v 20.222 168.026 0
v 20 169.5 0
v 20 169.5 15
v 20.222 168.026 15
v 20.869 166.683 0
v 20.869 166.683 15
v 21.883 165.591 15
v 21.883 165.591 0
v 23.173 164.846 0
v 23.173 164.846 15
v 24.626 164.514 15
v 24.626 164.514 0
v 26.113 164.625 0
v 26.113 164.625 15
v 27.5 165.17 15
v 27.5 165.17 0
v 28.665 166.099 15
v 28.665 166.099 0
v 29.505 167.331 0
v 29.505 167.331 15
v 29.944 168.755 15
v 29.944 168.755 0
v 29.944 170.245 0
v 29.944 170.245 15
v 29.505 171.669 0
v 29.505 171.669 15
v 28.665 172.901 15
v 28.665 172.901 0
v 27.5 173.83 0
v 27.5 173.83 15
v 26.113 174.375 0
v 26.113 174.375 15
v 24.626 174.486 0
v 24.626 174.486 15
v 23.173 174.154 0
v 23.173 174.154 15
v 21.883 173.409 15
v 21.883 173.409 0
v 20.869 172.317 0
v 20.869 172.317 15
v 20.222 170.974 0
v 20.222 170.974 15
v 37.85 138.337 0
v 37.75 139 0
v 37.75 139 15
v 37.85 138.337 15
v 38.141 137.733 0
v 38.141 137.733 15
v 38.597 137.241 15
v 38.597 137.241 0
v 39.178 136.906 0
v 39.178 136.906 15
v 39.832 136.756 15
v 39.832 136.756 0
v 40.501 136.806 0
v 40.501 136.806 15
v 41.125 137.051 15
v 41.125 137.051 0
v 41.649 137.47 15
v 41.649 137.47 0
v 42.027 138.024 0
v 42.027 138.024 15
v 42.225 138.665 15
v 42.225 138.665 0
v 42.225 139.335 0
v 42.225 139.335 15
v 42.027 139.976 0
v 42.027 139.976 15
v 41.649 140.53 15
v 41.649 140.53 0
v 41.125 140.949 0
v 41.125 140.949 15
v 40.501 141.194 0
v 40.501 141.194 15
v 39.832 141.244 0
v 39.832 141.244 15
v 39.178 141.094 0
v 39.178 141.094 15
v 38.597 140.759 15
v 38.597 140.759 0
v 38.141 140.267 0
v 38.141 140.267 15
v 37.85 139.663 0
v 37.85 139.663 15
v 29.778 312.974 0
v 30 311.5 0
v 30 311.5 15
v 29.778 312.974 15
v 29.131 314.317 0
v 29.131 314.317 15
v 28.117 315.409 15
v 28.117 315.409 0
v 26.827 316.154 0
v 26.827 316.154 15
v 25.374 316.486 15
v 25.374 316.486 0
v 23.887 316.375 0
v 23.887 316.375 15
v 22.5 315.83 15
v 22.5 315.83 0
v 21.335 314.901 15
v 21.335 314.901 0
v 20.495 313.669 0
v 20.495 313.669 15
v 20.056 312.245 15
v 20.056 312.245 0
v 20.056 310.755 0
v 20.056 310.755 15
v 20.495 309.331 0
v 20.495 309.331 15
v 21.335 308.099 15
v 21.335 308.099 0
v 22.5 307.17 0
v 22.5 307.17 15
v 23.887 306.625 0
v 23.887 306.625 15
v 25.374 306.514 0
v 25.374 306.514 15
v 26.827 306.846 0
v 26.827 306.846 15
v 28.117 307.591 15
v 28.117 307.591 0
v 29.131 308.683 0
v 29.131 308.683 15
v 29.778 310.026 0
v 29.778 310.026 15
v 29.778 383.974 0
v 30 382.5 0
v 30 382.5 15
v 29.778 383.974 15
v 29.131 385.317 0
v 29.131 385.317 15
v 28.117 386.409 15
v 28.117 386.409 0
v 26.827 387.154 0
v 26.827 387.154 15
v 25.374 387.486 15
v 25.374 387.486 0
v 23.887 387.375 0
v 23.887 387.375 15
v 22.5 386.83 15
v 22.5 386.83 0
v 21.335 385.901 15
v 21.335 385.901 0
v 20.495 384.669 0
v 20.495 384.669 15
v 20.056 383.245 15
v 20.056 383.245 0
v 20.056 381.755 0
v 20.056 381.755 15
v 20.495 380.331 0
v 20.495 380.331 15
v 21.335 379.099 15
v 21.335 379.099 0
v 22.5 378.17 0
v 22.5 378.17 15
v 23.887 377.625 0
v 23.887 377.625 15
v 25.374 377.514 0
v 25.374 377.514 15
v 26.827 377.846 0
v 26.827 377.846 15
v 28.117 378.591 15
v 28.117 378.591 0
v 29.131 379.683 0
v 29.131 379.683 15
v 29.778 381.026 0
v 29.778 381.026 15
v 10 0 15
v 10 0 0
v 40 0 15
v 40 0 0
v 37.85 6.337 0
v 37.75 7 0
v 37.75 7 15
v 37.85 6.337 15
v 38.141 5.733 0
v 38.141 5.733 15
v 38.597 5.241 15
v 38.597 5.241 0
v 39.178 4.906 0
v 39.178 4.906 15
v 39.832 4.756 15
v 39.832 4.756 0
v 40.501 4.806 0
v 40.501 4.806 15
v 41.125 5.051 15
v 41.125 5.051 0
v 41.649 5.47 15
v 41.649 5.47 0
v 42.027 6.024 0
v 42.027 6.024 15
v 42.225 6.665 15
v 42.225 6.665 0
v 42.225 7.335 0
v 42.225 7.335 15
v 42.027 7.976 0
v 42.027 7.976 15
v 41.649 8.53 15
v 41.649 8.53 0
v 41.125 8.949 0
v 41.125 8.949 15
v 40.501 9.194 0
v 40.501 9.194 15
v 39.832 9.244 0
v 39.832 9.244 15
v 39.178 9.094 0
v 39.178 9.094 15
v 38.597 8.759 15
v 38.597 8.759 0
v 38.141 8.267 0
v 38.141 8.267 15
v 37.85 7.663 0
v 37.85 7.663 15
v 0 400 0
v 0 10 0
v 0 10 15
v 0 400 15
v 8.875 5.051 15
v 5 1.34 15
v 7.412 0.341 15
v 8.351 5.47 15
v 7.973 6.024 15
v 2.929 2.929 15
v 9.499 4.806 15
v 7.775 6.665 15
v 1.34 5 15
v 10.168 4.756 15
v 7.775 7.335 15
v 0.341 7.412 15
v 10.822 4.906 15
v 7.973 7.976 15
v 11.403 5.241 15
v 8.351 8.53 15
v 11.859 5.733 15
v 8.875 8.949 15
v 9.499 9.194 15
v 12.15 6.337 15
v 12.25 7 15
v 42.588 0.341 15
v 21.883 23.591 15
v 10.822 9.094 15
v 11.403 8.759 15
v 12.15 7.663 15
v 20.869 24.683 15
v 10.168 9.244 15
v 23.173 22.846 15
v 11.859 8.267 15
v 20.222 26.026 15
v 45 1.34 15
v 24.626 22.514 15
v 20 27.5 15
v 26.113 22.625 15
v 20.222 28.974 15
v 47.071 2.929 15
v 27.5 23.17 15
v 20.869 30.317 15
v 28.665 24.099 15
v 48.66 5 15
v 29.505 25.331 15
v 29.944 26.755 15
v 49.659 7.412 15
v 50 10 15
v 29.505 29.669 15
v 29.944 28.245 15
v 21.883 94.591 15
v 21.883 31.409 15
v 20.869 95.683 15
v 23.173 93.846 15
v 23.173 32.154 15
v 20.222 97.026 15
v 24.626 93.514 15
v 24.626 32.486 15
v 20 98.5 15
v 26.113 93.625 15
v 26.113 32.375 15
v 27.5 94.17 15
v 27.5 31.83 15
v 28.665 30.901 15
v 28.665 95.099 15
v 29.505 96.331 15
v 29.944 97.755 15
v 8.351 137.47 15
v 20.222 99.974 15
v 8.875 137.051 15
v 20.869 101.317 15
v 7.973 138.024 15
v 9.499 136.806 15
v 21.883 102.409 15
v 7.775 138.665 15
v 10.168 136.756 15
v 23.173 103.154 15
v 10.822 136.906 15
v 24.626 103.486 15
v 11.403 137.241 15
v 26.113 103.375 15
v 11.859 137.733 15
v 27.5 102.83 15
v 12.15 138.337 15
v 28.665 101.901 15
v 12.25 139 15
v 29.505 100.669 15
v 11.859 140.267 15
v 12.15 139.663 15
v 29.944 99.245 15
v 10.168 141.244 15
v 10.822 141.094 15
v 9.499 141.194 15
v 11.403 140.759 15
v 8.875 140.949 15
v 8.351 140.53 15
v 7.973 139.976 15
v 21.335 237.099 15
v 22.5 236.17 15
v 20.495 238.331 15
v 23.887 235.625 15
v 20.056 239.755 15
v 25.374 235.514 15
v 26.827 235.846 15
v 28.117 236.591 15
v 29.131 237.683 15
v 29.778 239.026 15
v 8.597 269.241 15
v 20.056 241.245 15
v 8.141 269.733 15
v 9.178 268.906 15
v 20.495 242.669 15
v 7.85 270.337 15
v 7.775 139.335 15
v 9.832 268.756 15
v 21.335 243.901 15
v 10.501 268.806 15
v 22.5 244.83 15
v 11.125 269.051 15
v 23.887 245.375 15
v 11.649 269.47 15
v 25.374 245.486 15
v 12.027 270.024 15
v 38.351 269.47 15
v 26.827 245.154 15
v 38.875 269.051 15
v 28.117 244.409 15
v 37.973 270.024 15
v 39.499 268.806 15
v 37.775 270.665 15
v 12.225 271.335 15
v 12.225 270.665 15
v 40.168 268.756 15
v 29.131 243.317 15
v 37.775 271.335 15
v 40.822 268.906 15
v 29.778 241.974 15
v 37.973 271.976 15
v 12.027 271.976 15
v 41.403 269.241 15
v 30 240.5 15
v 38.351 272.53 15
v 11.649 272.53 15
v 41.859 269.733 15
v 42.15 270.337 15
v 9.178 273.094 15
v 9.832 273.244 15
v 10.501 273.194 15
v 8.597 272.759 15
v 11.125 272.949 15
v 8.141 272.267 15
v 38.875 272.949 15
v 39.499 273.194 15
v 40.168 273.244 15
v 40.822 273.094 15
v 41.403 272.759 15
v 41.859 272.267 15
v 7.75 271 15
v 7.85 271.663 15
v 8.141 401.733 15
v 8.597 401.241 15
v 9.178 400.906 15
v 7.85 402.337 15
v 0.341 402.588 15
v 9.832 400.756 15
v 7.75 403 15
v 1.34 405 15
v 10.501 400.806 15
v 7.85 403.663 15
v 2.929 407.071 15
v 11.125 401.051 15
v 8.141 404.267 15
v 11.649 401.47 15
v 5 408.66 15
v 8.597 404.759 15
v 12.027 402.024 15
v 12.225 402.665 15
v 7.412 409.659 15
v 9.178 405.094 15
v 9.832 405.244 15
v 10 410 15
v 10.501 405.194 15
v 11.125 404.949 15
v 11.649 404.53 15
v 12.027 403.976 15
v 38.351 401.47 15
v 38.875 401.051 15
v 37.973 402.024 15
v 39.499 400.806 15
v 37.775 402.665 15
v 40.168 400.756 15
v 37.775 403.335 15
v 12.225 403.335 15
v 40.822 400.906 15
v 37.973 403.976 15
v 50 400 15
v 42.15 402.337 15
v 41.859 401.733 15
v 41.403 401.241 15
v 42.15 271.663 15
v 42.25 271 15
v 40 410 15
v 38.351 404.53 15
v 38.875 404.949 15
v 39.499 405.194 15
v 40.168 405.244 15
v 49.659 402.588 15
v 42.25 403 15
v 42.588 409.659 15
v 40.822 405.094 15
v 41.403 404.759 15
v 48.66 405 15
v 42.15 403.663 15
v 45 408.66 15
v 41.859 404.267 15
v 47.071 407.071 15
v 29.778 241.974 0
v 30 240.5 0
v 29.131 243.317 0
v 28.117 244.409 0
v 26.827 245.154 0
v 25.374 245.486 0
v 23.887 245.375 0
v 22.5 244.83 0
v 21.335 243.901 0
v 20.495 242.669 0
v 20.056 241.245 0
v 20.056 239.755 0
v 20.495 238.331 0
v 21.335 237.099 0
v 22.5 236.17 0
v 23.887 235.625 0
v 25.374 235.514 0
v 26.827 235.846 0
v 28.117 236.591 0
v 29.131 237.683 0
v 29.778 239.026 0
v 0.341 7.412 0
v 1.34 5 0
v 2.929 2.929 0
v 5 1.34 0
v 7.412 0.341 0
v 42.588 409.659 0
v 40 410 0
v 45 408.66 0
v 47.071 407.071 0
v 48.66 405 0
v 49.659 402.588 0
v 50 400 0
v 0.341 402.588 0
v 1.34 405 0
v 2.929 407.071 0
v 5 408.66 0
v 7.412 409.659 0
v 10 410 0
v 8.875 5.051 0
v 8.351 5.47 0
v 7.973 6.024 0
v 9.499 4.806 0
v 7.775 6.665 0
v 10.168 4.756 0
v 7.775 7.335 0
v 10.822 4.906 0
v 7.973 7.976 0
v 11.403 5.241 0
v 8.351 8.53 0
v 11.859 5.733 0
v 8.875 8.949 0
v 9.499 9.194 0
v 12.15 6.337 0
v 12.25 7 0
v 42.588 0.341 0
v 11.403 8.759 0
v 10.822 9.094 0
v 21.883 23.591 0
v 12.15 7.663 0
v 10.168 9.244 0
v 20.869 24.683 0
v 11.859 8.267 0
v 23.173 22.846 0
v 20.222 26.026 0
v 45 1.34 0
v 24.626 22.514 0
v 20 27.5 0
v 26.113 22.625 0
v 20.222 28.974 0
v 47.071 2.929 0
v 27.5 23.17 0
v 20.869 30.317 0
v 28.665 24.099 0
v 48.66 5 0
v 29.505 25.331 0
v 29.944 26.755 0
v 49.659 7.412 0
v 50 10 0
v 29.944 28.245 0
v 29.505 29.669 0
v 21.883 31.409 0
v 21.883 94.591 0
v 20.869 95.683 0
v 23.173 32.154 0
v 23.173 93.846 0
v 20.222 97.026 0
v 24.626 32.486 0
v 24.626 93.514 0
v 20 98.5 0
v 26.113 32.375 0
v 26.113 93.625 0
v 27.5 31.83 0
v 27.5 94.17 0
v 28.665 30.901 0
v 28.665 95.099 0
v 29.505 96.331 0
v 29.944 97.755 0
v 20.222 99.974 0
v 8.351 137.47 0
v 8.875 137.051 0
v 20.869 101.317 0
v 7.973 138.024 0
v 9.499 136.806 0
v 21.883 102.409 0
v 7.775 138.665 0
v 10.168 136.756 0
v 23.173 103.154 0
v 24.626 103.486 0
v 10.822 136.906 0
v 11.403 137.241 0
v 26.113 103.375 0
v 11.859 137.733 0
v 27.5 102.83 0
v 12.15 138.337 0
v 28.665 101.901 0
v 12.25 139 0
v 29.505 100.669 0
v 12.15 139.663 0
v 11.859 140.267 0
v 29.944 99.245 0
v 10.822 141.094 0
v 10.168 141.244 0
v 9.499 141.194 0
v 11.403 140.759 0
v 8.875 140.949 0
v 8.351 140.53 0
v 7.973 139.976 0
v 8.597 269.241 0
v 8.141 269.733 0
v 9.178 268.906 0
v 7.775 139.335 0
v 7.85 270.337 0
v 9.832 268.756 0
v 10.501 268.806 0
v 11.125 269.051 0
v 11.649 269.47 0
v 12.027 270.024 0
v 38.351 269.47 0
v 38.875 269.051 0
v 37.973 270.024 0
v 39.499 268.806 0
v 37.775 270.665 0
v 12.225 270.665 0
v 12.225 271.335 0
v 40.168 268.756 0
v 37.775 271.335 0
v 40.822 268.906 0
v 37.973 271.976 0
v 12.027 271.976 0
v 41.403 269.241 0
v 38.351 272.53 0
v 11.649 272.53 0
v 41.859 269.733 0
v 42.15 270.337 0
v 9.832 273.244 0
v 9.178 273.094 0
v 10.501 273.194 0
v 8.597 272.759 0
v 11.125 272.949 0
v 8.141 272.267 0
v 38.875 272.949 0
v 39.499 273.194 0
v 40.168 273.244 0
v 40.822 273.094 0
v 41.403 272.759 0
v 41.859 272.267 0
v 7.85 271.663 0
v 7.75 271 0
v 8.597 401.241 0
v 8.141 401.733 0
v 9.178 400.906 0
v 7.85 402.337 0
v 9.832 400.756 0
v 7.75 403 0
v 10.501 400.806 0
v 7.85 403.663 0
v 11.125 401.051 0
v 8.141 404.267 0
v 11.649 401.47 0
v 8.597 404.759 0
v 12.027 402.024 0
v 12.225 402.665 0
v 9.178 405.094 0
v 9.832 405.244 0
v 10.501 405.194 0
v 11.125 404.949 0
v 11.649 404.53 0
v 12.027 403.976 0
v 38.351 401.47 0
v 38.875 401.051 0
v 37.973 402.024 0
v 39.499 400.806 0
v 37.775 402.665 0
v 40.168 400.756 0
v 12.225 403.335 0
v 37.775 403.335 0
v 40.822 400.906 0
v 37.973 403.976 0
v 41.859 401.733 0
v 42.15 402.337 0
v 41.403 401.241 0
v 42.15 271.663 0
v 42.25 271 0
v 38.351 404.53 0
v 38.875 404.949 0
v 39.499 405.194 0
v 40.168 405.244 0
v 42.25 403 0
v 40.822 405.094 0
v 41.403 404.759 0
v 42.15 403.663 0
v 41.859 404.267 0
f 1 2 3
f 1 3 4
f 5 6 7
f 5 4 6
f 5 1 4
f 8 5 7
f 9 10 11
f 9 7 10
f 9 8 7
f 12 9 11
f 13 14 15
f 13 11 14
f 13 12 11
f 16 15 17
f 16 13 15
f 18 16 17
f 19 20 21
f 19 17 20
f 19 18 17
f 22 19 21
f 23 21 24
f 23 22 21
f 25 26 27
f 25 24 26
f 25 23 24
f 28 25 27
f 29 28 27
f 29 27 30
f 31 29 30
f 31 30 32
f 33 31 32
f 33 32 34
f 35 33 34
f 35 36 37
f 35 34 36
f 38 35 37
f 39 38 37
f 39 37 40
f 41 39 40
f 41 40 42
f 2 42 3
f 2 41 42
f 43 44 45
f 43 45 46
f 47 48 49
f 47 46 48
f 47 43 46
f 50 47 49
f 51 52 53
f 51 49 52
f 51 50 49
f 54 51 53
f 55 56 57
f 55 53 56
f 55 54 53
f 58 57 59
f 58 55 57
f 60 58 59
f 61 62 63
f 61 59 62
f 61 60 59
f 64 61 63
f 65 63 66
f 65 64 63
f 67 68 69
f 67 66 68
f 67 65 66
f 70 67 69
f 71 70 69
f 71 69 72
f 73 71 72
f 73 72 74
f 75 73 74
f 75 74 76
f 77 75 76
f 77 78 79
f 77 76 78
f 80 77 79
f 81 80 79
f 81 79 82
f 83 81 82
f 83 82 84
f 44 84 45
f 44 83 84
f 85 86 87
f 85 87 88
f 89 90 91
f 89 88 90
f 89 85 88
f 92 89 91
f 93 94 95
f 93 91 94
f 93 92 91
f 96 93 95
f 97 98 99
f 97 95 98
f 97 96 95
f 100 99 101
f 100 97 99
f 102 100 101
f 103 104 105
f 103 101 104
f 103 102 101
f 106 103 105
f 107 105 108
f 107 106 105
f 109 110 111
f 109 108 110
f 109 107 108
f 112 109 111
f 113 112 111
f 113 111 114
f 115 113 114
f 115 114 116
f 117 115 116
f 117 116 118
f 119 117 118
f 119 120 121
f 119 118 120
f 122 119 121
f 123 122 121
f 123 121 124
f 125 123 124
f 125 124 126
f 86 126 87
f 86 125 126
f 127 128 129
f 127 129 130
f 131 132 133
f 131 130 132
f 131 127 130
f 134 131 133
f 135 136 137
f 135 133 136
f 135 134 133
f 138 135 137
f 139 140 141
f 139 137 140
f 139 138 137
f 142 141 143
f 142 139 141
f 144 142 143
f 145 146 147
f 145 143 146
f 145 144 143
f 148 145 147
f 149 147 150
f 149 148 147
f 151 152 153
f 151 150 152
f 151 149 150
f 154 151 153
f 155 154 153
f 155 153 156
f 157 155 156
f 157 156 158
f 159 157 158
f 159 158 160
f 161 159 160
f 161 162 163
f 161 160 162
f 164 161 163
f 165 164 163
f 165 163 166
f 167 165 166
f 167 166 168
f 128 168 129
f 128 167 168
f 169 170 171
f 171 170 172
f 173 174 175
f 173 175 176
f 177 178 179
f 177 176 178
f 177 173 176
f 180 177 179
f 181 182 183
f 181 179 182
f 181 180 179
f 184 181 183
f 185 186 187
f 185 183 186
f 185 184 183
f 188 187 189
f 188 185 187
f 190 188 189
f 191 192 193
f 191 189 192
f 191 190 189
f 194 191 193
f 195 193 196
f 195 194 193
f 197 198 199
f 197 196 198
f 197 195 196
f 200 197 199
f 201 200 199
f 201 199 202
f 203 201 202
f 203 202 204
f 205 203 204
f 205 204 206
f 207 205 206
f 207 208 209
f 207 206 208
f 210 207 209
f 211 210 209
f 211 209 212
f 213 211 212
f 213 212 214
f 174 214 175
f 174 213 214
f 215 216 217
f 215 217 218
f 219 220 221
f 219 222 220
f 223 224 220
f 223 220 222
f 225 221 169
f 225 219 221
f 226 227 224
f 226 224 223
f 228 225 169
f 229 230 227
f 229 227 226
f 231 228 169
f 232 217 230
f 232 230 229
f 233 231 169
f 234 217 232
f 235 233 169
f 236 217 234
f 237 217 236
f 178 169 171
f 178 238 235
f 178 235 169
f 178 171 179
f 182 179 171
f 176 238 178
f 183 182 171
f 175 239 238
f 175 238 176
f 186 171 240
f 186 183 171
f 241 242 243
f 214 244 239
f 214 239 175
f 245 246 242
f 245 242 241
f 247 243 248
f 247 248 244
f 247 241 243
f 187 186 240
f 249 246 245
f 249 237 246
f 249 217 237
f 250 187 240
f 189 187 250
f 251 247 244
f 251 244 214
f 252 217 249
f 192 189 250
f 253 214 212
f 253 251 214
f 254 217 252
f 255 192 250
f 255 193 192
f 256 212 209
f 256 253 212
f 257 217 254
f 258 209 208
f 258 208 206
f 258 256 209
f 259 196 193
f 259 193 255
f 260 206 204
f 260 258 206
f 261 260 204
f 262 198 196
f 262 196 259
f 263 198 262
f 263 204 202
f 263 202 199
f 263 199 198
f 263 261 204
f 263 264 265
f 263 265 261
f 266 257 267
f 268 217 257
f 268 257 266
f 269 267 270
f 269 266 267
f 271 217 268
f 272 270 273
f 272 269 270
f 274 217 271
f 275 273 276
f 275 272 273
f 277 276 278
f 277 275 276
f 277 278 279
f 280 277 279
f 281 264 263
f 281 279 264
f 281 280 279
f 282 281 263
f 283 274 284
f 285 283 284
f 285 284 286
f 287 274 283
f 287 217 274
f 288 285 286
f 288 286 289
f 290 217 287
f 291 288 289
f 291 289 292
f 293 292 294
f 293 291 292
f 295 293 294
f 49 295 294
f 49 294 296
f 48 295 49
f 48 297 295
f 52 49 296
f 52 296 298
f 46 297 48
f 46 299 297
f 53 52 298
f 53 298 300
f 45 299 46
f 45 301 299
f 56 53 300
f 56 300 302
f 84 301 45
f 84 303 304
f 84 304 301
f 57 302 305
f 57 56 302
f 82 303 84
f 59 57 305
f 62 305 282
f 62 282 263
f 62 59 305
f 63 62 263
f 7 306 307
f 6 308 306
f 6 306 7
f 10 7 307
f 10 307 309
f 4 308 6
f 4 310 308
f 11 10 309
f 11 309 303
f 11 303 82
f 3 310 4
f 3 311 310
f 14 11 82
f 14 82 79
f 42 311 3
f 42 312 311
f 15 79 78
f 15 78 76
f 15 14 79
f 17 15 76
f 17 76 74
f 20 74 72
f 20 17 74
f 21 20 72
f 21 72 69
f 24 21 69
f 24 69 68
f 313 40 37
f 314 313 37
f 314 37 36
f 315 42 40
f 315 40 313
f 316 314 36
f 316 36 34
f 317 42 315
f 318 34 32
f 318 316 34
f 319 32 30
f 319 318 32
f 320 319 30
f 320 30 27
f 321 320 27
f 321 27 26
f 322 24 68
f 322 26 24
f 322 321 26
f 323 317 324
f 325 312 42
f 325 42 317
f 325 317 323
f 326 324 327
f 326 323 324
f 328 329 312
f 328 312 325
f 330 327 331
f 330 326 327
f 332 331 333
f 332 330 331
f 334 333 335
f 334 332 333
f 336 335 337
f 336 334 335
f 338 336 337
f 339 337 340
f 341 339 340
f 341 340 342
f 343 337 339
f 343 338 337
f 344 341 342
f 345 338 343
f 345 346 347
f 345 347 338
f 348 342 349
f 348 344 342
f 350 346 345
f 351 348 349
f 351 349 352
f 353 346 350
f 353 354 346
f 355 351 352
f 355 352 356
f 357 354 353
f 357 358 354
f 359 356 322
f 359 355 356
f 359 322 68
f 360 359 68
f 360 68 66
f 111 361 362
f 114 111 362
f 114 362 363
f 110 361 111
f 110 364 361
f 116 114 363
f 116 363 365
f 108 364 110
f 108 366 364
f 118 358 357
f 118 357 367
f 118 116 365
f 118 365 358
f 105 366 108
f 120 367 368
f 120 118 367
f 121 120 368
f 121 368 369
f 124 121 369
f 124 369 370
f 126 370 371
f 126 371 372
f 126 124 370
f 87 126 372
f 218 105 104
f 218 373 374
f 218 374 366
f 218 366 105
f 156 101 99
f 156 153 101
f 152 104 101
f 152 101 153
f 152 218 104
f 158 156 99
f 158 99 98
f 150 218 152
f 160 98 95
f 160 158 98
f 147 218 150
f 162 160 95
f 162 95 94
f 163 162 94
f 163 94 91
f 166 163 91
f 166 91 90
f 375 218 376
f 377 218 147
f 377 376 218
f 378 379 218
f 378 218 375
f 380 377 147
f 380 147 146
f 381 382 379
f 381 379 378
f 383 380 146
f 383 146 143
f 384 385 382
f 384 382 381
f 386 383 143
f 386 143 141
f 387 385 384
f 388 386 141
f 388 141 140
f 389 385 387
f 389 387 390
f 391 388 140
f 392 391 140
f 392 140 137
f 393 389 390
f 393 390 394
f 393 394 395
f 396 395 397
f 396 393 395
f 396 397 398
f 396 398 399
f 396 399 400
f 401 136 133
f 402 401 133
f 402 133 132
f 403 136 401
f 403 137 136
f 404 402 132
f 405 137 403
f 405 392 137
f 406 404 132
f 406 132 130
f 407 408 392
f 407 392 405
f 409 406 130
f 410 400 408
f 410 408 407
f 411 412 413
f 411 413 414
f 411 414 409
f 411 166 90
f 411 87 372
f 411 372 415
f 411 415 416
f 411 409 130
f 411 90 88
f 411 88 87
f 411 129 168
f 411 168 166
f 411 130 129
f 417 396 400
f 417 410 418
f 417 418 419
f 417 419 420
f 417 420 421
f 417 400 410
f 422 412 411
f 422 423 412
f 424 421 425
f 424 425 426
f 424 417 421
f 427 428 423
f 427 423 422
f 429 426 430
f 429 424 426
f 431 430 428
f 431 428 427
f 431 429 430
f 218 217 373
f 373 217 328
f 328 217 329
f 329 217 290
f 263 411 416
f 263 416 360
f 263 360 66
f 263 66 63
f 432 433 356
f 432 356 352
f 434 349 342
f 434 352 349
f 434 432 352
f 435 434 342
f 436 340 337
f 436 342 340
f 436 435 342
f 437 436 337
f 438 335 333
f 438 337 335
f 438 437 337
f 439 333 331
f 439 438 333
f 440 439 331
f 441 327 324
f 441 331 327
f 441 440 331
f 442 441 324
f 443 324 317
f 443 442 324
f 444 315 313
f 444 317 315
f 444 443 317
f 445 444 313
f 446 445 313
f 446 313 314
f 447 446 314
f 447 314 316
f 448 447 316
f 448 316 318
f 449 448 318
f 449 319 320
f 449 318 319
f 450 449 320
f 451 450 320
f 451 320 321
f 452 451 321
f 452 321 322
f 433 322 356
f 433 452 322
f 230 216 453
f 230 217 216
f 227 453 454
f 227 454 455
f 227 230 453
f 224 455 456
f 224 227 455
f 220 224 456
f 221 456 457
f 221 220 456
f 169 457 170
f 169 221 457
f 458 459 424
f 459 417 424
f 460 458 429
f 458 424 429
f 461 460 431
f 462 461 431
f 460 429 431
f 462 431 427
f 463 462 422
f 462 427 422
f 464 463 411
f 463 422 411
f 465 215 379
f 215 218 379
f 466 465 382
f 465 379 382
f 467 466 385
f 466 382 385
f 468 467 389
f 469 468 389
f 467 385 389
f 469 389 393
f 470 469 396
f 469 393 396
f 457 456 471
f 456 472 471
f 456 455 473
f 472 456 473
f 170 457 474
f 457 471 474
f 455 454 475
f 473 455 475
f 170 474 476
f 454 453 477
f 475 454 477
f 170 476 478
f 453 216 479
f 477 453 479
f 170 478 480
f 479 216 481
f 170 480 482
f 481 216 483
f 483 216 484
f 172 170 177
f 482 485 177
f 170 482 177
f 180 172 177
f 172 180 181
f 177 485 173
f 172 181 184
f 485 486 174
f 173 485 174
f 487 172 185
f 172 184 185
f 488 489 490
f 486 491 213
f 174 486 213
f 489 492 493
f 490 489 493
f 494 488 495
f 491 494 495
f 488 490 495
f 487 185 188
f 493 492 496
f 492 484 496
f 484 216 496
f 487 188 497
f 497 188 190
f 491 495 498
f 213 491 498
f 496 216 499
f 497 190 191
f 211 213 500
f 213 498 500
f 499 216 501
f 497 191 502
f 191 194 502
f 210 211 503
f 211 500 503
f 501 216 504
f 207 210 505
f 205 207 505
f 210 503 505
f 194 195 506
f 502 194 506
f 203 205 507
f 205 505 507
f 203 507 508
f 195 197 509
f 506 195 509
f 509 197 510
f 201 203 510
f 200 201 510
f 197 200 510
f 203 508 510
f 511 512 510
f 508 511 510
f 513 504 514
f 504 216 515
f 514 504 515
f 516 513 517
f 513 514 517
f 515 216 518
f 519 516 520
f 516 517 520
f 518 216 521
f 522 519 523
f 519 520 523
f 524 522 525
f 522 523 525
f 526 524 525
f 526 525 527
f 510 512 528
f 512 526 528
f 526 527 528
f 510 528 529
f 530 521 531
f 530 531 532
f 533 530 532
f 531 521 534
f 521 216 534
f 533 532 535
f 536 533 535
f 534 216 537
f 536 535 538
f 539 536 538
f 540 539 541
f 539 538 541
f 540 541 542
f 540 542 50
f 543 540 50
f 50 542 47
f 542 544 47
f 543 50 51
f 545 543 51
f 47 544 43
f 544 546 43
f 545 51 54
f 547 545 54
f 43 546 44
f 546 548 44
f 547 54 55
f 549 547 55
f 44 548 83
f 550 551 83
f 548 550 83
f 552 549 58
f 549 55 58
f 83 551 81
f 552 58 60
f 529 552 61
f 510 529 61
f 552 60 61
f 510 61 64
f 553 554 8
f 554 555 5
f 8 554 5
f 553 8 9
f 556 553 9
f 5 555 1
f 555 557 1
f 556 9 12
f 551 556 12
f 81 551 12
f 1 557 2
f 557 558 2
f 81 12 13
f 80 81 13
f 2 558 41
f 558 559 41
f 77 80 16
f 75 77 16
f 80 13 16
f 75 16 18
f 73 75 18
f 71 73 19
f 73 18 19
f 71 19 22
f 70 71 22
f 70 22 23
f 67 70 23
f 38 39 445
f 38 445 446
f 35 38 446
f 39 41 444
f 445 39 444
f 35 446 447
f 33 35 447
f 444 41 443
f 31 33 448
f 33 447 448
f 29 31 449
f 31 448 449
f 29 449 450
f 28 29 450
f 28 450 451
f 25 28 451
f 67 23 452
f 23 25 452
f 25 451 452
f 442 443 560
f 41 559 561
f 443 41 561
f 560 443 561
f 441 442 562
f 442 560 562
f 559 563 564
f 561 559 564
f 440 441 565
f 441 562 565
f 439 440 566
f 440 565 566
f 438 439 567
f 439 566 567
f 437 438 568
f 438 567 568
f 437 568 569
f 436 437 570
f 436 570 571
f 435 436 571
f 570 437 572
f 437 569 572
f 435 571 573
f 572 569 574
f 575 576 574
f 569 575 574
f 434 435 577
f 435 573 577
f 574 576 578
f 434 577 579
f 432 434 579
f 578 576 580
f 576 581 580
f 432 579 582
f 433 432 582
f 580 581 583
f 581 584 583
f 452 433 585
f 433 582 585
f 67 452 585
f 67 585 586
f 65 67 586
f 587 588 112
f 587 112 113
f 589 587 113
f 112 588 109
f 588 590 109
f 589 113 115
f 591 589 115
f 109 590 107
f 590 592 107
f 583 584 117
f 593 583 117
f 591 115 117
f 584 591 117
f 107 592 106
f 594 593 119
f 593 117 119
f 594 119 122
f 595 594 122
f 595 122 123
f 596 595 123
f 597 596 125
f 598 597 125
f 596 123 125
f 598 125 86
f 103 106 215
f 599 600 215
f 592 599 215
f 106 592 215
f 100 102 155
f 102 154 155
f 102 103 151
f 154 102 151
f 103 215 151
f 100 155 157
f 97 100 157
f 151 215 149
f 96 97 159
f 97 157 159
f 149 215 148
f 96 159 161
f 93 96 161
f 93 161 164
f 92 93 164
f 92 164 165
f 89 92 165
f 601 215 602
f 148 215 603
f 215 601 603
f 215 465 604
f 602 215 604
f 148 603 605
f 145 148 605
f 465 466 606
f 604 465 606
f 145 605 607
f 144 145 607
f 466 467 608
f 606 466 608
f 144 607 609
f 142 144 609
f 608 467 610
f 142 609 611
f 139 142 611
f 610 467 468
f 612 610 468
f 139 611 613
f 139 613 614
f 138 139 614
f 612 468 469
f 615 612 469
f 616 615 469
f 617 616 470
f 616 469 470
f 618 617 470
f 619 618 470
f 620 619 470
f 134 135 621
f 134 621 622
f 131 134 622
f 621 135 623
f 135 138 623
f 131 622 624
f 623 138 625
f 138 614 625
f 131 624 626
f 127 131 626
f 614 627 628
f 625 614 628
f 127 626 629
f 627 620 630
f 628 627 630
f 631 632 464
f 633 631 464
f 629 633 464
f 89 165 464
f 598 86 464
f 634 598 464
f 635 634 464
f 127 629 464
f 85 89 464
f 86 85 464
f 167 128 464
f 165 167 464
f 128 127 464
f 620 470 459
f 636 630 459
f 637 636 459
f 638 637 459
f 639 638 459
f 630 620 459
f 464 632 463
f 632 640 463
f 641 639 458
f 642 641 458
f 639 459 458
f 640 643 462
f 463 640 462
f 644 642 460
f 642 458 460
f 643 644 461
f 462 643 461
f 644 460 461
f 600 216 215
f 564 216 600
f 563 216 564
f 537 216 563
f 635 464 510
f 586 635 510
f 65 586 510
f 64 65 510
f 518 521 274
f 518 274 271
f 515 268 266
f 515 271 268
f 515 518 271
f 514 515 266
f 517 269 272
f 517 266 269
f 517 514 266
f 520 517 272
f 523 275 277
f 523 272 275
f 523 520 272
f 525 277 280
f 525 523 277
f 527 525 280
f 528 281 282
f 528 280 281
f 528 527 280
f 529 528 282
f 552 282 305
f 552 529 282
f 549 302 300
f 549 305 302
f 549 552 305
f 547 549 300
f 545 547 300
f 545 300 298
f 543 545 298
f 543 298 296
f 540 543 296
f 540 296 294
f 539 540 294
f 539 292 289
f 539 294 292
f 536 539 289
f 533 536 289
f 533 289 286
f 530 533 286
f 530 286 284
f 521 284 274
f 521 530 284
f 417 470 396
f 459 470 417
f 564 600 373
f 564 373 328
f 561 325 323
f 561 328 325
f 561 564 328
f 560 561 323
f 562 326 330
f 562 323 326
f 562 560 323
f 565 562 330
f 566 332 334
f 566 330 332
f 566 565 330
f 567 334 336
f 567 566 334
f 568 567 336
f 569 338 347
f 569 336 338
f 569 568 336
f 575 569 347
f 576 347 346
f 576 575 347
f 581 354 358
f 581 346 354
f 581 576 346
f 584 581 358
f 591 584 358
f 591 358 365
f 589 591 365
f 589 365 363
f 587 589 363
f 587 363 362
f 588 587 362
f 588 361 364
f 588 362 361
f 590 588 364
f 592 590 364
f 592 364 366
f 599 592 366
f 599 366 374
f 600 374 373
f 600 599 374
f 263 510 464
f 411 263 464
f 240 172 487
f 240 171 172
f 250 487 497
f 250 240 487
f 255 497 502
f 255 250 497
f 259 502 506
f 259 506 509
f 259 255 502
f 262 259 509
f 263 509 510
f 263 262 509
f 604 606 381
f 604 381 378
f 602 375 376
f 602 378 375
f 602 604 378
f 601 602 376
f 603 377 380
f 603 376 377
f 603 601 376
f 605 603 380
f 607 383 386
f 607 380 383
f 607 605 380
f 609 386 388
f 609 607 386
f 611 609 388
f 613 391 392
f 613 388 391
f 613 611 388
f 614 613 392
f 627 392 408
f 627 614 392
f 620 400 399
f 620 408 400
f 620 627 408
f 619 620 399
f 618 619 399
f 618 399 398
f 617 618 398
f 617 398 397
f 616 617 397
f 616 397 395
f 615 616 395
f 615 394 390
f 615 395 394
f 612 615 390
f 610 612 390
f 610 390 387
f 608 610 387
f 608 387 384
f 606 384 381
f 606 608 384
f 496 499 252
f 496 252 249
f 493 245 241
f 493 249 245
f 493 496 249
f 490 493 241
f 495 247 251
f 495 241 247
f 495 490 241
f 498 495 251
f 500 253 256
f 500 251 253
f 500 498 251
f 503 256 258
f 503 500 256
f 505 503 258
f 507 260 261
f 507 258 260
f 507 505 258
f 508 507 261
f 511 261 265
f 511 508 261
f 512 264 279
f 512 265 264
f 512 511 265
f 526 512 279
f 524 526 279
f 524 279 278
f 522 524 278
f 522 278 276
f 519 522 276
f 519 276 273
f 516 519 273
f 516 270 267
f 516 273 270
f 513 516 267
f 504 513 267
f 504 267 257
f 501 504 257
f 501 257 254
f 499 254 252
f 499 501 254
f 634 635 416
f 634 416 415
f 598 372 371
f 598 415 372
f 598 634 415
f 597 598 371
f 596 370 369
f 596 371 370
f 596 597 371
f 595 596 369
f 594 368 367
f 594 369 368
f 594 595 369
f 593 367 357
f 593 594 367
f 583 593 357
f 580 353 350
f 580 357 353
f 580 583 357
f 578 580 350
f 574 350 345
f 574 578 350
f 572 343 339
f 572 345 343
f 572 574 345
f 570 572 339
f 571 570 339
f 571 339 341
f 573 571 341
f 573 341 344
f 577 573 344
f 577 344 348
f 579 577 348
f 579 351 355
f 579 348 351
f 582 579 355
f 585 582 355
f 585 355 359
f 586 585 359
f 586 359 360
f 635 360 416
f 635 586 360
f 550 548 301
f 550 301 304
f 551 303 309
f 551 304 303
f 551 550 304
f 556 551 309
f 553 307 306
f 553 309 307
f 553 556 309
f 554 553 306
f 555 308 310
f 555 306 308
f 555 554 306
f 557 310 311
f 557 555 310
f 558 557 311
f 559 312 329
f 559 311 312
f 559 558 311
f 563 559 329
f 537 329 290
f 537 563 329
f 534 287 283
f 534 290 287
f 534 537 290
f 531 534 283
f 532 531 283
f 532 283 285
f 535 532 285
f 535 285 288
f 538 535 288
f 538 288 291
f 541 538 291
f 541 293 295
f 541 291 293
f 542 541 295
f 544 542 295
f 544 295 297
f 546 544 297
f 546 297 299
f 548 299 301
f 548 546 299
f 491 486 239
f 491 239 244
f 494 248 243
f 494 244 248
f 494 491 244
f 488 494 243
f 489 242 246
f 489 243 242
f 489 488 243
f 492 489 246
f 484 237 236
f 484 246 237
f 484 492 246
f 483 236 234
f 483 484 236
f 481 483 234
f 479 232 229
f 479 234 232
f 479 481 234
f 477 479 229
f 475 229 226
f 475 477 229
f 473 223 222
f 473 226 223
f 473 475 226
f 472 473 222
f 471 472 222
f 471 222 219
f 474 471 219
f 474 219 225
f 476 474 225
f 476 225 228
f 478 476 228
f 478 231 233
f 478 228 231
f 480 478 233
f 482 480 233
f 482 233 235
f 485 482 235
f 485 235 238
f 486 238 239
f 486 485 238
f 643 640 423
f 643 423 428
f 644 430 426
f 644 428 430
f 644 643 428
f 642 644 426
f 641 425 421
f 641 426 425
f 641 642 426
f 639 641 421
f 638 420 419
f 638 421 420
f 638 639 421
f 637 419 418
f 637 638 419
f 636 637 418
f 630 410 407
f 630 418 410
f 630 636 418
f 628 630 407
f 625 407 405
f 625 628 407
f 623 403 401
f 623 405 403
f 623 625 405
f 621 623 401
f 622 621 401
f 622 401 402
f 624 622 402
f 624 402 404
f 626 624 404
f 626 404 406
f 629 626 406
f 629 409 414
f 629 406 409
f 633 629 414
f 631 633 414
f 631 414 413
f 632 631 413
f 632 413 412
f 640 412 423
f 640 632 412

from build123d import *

# Parameters (mm, degrees)
ESQUISSE1_W                  = 50
ESQUISSE1_H                  = 410
BOSS_EXTRU_1_DEPTH           = 15
ENL_V_MAT_EXTRU_1_DEPTH      = 414.309811159
ENL_V_MAT_EXTRU_1_DEPTH_BACK = 414.309811159
ESQUISSE2_R                  = 5
ESQUISSE2_R_2                = 2.25
CONG_1_R                     = 10


with BuildPart() as part:
    # Esquisse1 → Boss.-Extru.1 (new body)
    with BuildSketch(Plane.XY):
        with Locations((25, 205)):
            Rectangle(ESQUISSE1_W, ESQUISSE1_H)
    extrude(amount=BOSS_EXTRU_1_DEPTH)

    # Esquisse2 → Enlèv. mat.-Extru.1 (cut, two sides: drawn at the far end of the back side and taken through both)
    with BuildSketch(Plane.XY.offset(15).offset(-ENL_V_MAT_EXTRU_1_DEPTH_BACK)):
        with Locations((25, 240.5)):
            Circle(ESQUISSE2_R)
        with Locations((25, 311.5)):
            Circle(ESQUISSE2_R)
        with Locations((25, 382.5)):
            Circle(ESQUISSE2_R)
        with Locations(Location((25, 27.5, 0), (0, 0, 180))):
            Circle(ESQUISSE2_R)
        with Locations(Location((25, 98.5, 0), (0, 0, 180))):
            Circle(ESQUISSE2_R)
        with Locations(Location((25, 169.5, 0), (0, 0, 180))):
            Circle(ESQUISSE2_R)
        with Locations((40, 271)):
            Circle(ESQUISSE2_R_2)
        with Locations((40, 403)):
            Circle(ESQUISSE2_R_2)
        with Locations(Location((40, 7, 0), (0, 0, 180))):
            Circle(ESQUISSE2_R_2)
        with Locations(Location((40, 139, 0), (0, 0, 180))):
            Circle(ESQUISSE2_R_2)
        with Locations((10, 139)):
            Circle(ESQUISSE2_R_2)
        with Locations((10, 7)):
            Circle(ESQUISSE2_R_2)
        with Locations(Location((10, 403, 0), (0, 0, 180))):
            Circle(ESQUISSE2_R_2)
        with Locations(Location((10, 271, 0), (0, 0, 180))):
            Circle(ESQUISSE2_R_2)
    extrude(amount=ENL_V_MAT_EXTRU_1_DEPTH + ENL_V_MAT_EXTRU_1_DEPTH_BACK, mode=Mode.SUBTRACT)

    # Congé1
    cong_1_edges = [part.edges().sort_by_distance(p)[0] for p in [
        (0, 410, 7.5),
        (50, 410, 7.5),
        (50, 0, 7.5),
        (0, 0, 7.5),
    ]]
    fillet(cong_1_edges, radius=CONG_1_R)


solid = part.part
